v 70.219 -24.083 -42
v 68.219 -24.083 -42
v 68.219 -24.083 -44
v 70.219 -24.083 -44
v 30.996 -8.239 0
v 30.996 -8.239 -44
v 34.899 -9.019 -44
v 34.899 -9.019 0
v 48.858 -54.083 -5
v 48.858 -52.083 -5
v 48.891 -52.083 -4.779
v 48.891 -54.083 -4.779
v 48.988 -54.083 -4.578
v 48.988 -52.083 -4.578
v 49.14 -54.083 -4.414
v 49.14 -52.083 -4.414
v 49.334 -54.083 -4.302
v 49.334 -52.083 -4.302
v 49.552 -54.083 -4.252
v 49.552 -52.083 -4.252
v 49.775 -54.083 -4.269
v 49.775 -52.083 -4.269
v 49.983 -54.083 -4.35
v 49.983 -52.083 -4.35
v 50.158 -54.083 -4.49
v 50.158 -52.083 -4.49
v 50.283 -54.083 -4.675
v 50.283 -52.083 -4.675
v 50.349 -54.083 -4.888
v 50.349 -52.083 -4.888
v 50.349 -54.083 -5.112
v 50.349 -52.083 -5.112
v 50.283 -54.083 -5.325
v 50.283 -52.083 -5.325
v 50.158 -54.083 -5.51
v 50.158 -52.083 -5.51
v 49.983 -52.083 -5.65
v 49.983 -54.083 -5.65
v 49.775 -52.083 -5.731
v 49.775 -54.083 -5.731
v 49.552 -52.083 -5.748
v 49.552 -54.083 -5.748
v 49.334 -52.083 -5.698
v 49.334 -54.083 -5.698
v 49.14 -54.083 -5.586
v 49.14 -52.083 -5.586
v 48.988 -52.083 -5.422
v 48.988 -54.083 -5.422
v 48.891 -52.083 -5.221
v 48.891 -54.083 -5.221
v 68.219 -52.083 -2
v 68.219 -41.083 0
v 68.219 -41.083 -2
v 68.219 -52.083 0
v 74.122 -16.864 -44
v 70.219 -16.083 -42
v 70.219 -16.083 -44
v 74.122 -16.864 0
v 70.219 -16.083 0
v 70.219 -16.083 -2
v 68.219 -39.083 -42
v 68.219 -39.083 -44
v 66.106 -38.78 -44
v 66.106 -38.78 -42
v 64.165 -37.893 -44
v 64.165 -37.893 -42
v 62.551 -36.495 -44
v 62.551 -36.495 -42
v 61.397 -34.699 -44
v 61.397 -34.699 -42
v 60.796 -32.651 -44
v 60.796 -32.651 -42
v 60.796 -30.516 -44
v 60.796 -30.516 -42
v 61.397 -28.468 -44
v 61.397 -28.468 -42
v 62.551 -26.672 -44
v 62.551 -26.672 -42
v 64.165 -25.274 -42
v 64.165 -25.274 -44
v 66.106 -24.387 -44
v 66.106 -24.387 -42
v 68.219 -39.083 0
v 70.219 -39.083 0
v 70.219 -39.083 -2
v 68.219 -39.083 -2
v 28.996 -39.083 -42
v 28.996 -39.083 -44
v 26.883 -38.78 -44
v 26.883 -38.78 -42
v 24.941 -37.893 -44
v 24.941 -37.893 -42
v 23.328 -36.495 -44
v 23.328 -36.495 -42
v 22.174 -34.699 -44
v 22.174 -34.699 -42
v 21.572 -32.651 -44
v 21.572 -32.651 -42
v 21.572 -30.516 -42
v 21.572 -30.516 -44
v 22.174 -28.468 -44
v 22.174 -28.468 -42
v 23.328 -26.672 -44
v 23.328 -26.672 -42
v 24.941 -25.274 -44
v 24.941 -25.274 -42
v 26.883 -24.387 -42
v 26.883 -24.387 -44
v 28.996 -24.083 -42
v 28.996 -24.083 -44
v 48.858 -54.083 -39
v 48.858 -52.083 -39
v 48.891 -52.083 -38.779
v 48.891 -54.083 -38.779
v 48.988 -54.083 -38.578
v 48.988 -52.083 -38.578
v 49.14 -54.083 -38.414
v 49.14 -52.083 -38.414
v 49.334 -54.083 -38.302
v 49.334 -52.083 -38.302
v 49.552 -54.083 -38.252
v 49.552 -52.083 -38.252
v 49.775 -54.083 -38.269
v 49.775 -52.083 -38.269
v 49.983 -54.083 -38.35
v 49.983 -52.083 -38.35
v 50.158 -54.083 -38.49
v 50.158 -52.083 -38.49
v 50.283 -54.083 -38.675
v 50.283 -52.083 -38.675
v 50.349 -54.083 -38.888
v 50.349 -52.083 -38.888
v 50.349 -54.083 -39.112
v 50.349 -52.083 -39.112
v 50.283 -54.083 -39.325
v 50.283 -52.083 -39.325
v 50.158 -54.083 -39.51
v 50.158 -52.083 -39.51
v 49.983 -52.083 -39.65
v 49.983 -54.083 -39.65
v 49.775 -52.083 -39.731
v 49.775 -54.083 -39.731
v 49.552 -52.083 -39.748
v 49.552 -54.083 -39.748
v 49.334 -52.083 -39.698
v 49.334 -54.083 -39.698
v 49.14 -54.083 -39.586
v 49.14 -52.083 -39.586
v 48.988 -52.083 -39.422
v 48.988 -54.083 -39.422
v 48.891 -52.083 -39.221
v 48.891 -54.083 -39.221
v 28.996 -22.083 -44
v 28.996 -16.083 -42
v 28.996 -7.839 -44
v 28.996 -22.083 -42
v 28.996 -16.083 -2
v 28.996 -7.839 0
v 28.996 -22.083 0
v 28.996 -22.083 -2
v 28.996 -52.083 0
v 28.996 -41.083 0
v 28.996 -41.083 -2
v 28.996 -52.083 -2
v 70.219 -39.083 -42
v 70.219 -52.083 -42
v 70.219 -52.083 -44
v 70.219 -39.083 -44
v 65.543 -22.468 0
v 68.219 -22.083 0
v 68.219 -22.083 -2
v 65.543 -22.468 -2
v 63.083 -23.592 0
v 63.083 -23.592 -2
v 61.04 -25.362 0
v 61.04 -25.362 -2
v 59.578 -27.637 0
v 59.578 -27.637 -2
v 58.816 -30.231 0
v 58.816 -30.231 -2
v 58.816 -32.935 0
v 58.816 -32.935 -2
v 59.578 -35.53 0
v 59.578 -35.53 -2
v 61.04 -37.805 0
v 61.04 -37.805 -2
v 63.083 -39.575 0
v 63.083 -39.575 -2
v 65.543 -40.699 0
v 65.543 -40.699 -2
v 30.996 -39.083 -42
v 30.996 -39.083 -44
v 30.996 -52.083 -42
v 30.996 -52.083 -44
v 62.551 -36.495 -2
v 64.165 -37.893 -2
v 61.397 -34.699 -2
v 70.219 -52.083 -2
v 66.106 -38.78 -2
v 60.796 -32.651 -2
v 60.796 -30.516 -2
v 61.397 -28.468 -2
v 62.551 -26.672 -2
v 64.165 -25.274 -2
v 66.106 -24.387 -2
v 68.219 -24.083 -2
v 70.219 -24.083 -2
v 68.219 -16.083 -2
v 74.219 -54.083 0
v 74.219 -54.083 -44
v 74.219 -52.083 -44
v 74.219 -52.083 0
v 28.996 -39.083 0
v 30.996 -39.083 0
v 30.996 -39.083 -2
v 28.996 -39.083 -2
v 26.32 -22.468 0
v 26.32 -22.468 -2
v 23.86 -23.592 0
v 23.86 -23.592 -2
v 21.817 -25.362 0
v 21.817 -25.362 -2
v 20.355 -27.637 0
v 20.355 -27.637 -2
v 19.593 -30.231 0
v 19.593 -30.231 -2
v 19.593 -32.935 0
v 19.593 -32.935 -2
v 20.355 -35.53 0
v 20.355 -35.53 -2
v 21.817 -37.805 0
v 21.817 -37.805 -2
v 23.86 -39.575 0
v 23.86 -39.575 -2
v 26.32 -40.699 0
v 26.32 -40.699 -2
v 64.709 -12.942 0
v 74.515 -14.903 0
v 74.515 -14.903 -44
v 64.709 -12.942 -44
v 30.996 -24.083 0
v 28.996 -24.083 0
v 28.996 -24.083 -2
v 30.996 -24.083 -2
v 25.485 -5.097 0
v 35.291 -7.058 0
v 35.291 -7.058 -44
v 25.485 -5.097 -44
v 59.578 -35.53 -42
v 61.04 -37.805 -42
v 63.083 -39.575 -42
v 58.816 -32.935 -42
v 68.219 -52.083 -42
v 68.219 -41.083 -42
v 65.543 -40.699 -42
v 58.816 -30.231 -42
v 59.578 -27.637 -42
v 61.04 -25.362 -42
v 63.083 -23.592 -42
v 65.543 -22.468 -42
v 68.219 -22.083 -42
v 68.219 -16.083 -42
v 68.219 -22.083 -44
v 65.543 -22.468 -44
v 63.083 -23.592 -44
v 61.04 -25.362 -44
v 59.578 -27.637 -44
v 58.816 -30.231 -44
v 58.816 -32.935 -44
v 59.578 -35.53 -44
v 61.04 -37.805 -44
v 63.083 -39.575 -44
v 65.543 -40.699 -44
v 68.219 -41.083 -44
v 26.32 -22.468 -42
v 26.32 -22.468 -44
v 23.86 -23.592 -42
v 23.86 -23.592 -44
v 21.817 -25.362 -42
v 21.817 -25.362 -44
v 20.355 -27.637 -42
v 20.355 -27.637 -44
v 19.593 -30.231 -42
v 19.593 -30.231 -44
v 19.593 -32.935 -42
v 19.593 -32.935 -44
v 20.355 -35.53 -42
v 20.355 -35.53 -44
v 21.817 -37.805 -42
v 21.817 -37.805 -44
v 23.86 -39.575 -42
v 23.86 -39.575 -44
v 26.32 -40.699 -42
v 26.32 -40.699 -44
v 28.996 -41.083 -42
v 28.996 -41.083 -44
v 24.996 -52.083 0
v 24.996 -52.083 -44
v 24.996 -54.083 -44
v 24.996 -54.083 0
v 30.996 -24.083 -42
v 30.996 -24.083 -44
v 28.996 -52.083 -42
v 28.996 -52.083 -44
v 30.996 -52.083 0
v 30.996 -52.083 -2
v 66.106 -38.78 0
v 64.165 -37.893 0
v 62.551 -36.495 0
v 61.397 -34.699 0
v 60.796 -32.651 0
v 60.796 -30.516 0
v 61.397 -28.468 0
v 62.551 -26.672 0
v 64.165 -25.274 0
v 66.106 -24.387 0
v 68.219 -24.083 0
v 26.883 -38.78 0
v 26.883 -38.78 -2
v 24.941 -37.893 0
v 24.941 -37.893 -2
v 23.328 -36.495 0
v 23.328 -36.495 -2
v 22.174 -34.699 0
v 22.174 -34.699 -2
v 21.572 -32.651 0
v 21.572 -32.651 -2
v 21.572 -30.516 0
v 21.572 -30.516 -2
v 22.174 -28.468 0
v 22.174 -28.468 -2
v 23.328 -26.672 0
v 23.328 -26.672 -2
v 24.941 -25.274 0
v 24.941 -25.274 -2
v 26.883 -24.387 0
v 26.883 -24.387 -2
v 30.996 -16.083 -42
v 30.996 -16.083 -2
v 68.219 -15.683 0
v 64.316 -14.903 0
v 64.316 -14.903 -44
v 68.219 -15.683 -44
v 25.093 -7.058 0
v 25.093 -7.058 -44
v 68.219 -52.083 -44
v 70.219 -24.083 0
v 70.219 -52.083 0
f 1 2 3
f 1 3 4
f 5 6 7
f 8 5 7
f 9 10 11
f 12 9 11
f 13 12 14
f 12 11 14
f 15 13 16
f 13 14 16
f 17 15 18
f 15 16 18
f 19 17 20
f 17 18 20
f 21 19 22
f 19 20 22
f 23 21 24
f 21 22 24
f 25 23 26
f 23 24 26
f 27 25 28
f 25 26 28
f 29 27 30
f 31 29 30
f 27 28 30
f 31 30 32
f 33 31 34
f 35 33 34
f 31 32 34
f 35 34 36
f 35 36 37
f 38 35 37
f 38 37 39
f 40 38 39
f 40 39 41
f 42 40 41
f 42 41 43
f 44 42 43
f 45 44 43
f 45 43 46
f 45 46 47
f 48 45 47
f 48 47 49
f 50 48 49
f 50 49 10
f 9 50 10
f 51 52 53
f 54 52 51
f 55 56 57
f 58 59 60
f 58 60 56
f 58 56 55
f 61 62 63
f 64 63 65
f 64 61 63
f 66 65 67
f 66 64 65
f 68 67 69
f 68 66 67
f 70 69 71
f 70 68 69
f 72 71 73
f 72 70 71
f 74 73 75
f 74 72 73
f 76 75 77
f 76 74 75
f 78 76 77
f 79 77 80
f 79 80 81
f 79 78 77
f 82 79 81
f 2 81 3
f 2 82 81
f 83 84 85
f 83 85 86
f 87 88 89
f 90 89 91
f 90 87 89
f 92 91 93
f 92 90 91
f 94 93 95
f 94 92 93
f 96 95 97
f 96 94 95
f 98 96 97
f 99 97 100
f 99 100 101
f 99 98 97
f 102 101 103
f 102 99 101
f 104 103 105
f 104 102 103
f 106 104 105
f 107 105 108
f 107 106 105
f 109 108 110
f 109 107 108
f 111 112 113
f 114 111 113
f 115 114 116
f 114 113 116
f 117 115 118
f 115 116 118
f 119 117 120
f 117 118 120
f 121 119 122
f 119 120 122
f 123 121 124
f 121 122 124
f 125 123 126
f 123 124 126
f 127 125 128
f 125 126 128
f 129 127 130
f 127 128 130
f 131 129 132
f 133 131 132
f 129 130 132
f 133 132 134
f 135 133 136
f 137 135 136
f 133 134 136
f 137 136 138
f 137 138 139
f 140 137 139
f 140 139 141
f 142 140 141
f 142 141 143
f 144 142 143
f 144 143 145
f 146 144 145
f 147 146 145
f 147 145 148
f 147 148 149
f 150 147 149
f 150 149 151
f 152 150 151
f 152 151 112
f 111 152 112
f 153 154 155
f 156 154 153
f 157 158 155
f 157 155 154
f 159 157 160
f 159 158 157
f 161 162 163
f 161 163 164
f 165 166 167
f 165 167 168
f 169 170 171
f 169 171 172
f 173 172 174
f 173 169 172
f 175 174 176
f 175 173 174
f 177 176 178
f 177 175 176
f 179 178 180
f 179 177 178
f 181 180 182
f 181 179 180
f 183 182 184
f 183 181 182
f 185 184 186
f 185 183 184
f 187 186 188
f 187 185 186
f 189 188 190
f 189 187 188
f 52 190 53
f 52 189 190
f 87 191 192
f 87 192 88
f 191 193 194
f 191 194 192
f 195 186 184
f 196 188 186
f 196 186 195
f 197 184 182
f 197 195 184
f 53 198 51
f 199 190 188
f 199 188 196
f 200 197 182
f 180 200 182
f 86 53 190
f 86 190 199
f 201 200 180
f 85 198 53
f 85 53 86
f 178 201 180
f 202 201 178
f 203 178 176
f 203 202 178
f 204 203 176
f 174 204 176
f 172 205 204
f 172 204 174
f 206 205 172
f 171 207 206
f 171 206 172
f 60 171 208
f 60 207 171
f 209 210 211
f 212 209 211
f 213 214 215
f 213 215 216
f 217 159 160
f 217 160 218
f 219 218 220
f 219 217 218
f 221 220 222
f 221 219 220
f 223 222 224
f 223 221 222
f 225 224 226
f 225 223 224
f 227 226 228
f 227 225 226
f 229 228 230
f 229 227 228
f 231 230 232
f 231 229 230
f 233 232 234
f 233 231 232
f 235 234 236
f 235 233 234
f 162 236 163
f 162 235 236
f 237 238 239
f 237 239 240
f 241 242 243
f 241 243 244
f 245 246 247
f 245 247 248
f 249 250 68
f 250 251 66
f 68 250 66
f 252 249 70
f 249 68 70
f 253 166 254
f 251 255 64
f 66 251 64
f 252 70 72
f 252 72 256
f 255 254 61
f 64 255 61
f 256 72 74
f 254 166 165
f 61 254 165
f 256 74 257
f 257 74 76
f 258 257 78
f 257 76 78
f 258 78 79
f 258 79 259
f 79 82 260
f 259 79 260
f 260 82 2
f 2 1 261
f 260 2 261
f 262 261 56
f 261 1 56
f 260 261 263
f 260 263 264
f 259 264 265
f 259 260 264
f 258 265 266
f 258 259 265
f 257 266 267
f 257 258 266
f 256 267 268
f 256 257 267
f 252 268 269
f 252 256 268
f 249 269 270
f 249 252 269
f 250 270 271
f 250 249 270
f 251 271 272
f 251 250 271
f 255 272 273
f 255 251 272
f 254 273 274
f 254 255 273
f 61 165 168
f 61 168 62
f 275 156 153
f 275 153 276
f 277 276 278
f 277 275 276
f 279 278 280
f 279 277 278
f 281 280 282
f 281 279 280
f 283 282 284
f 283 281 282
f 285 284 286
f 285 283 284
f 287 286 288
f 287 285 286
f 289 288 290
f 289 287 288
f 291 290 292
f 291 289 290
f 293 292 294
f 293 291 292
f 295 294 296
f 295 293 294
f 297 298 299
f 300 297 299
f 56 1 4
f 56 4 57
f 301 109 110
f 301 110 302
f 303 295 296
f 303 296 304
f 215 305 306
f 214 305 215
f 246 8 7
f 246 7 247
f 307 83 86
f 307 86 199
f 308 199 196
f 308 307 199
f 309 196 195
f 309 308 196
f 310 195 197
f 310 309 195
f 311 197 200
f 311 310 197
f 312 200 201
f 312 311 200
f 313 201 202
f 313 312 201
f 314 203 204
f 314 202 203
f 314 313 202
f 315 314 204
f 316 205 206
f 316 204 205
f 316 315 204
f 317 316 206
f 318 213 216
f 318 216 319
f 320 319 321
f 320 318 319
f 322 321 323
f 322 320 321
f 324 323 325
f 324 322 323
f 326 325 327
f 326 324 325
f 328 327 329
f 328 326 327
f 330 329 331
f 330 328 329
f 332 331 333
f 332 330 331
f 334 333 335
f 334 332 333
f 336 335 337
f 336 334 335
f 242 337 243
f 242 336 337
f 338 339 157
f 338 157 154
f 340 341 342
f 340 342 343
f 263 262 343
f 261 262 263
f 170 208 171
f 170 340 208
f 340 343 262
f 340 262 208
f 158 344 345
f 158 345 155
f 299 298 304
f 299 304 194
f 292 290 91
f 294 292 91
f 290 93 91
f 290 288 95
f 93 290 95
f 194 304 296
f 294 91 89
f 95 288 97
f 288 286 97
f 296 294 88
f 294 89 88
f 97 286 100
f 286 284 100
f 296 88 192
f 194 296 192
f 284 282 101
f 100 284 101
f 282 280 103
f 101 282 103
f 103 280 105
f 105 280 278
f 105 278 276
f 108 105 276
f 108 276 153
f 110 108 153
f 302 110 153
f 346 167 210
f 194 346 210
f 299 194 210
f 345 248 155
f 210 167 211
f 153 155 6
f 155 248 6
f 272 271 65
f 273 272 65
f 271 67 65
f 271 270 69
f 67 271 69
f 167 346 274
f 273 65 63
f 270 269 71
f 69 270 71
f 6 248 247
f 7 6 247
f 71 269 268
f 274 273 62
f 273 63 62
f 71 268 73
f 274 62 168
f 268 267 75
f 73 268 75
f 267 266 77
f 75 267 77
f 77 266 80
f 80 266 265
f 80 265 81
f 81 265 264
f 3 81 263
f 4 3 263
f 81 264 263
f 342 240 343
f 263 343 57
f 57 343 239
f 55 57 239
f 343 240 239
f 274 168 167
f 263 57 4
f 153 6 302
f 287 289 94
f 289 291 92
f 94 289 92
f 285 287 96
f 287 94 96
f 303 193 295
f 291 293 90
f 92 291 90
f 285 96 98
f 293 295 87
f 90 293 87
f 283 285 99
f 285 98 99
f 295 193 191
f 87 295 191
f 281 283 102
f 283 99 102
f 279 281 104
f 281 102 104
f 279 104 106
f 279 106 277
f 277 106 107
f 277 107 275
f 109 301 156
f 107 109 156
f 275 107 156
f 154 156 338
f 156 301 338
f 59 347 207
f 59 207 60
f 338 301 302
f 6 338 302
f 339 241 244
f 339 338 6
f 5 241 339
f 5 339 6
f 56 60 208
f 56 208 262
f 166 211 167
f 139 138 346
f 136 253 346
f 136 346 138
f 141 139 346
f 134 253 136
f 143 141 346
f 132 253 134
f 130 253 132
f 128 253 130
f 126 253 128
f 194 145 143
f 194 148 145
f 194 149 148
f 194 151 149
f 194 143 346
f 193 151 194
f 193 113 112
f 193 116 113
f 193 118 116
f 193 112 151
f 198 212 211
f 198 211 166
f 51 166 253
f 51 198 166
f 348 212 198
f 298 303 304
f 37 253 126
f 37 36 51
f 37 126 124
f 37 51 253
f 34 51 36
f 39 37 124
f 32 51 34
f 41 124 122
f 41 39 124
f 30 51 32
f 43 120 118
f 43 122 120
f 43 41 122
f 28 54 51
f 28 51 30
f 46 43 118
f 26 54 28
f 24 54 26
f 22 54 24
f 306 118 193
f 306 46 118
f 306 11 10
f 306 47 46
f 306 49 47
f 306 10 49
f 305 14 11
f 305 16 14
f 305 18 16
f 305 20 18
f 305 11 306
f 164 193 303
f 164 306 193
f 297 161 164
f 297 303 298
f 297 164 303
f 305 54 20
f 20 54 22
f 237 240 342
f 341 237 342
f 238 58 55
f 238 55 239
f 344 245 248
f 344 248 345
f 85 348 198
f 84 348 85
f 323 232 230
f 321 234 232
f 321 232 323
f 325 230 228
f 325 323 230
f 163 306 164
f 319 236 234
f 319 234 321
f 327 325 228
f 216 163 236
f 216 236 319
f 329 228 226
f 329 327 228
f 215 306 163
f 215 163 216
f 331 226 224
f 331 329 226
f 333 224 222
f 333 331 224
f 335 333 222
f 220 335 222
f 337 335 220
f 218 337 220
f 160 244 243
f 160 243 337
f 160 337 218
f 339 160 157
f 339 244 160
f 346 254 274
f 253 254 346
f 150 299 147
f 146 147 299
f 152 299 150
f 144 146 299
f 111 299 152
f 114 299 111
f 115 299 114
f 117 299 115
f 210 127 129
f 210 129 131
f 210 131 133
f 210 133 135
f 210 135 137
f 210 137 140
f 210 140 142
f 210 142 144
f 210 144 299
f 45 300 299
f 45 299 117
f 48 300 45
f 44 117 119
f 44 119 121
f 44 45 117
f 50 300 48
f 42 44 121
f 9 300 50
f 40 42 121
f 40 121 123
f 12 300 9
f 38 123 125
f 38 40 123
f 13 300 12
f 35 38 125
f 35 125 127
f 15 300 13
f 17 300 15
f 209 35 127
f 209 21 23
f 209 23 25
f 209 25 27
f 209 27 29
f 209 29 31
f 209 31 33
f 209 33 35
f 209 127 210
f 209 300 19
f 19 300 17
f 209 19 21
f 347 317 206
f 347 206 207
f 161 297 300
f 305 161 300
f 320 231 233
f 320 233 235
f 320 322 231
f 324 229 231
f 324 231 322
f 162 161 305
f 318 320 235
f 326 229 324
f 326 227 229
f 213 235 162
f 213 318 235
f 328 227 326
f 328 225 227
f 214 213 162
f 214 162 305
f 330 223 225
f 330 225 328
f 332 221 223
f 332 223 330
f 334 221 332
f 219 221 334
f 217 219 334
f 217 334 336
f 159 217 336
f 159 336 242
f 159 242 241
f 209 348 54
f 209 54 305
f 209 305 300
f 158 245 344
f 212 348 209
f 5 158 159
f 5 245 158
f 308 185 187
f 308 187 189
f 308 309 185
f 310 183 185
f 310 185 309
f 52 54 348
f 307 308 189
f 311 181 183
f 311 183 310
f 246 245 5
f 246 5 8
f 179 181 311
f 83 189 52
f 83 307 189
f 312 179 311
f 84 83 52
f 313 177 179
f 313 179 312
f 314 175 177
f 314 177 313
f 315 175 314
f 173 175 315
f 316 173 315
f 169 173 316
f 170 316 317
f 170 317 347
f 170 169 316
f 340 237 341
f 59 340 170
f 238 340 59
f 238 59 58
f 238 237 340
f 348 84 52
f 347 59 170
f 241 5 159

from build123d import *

# Parameters (mm, degrees)
BOSS_EXTRUDE1_DEPTH = 44
SKETCH2_W           = 40
SKETCH2_H           = 36
CUT_EXTRUDE1_DEPTH  = 87.219887541
SKETCH3_R           = 0.75
CUT_EXTRUDE2_DEPTH  = 99.468948566


with BuildPart() as part:
    # Sketch1 → Boss-Extrude1 (new body)
    with BuildSketch(Plane.XY):
        with BuildLine():
            Line((25.485483108, -5.097096622), (25.093250837, -7.058257973))
            Line((25.093250837, -7.058257973), (28.996154216, -7.838838649))
            Line((28.996154216, -7.838838649), (28.996154216, -22.083484054))
            ThreePointArc((28.996154216, -22.083484054), (19.496154216, -31.583484054), (28.996154216, -41.083484054))
            Line((28.996154216, -41.083484054), (28.996154216, -52.083484054))
            Line((28.996154216, -52.083484054), (24.996154216, -52.083484054))
            Line((24.996154216, -52.083484054), (24.996154216, -54.083484054))
            Line((24.996154216, -54.083484054), (74.219381244, -54.083484054))
            Line((74.219381244, -54.083484054), (74.219381244, -52.083484054))
            Line((74.219381244, -52.083484054), (70.219381244, -52.083484054))
            Line((70.219381244, -52.083484054), (70.219381244, -39.083484054))
            Line((70.219381244, -39.083484054), (68.219381244, -39.083484054))
            ThreePointArc((68.219381244, -39.083484054), (60.719381244, -31.583484054), (68.219381244, -24.083484054))
            Line((68.219381244, -24.083484054), (70.219381244, -24.083484054))
            Line((70.219381244, -24.083484054), (70.219381244, -20.083484054))
            Line((70.219381244, -20.083484054), (70.219381244, -16.083484054))
            Line((70.219381244, -16.083484054), (74.122284622, -16.86406473))
            Line((74.122284622, -16.86406473), (74.514516892, -14.902903378))
            Line((74.514516892, -14.902903378), (64.708710135, -12.941742027))
            Line((64.708710135, -12.941742027), (64.316477865, -14.902903378))
            Line((64.316477865, -14.902903378), (68.219381244, -15.683484054))
            Line((68.219381244, -15.683484054), (68.219381244, -22.083484054))
            ThreePointArc((68.219381244, -22.083484054), (58.719381244, -31.583484054), (68.219381244, -41.083484054))
            Line((68.219381244, -41.083484054), (68.219381244, -52.083484054))
            Line((68.219381244, -52.083484054), (30.996154216, -52.083484054))
            Line((30.996154216, -52.083484054), (30.996154216, -39.083484054))
            Line((30.996154216, -39.083484054), (28.996154216, -39.083484054))
            ThreePointArc((28.996154216, -39.083484054), (21.496154216, -31.583484054), (28.996154216, -24.083484054))
            Line((28.996154216, -24.083484054), (30.996154216, -24.083484054))
            Line((30.996154216, -24.083484054), (30.996154216, -8.238838649))
            Line((30.996154216, -8.238838649), (34.899057594, -9.019419324))
            Line((34.899057594, -9.019419324), (35.291289865, -7.058257973))
            Line((35.291289865, -7.058257973), (25.485483108, -5.097096622))
        make_face()
    extrude(amount=-BOSS_EXTRUDE1_DEPTH)

    # Sketch2 → Cut-Extrude1 (cut, through all)
    with BuildSketch(Plane(origin=(70.219381244, 0, 0), x_dir=(0, 0, -1), z_dir=(1, 0, 0))):
        with Locations((22, -34.083484054)):
            Rectangle(SKETCH2_W, SKETCH2_H)
    extrude(amount=-CUT_EXTRUDE1_DEPTH, mode=Mode.SUBTRACT)

    # Sketch3 → Cut-Extrude2 (cut, through all)
    with BuildSketch(Plane(origin=(0, -52.083484054, 0), x_dir=(1, 0, 0), z_dir=(0, 1, 0))):
        with Locations(Location((49.60776773, 39, 0), (0, 0, 180))):
            Circle(SKETCH3_R)
        with Locations(Location((49.60776773, 5, 0), (0, 0, 180))):
            Circle(SKETCH3_R)
    extrude(amount=-CUT_EXTRUDE2_DEPTH, mode=Mode.SUBTRACT)


solid = part.part
